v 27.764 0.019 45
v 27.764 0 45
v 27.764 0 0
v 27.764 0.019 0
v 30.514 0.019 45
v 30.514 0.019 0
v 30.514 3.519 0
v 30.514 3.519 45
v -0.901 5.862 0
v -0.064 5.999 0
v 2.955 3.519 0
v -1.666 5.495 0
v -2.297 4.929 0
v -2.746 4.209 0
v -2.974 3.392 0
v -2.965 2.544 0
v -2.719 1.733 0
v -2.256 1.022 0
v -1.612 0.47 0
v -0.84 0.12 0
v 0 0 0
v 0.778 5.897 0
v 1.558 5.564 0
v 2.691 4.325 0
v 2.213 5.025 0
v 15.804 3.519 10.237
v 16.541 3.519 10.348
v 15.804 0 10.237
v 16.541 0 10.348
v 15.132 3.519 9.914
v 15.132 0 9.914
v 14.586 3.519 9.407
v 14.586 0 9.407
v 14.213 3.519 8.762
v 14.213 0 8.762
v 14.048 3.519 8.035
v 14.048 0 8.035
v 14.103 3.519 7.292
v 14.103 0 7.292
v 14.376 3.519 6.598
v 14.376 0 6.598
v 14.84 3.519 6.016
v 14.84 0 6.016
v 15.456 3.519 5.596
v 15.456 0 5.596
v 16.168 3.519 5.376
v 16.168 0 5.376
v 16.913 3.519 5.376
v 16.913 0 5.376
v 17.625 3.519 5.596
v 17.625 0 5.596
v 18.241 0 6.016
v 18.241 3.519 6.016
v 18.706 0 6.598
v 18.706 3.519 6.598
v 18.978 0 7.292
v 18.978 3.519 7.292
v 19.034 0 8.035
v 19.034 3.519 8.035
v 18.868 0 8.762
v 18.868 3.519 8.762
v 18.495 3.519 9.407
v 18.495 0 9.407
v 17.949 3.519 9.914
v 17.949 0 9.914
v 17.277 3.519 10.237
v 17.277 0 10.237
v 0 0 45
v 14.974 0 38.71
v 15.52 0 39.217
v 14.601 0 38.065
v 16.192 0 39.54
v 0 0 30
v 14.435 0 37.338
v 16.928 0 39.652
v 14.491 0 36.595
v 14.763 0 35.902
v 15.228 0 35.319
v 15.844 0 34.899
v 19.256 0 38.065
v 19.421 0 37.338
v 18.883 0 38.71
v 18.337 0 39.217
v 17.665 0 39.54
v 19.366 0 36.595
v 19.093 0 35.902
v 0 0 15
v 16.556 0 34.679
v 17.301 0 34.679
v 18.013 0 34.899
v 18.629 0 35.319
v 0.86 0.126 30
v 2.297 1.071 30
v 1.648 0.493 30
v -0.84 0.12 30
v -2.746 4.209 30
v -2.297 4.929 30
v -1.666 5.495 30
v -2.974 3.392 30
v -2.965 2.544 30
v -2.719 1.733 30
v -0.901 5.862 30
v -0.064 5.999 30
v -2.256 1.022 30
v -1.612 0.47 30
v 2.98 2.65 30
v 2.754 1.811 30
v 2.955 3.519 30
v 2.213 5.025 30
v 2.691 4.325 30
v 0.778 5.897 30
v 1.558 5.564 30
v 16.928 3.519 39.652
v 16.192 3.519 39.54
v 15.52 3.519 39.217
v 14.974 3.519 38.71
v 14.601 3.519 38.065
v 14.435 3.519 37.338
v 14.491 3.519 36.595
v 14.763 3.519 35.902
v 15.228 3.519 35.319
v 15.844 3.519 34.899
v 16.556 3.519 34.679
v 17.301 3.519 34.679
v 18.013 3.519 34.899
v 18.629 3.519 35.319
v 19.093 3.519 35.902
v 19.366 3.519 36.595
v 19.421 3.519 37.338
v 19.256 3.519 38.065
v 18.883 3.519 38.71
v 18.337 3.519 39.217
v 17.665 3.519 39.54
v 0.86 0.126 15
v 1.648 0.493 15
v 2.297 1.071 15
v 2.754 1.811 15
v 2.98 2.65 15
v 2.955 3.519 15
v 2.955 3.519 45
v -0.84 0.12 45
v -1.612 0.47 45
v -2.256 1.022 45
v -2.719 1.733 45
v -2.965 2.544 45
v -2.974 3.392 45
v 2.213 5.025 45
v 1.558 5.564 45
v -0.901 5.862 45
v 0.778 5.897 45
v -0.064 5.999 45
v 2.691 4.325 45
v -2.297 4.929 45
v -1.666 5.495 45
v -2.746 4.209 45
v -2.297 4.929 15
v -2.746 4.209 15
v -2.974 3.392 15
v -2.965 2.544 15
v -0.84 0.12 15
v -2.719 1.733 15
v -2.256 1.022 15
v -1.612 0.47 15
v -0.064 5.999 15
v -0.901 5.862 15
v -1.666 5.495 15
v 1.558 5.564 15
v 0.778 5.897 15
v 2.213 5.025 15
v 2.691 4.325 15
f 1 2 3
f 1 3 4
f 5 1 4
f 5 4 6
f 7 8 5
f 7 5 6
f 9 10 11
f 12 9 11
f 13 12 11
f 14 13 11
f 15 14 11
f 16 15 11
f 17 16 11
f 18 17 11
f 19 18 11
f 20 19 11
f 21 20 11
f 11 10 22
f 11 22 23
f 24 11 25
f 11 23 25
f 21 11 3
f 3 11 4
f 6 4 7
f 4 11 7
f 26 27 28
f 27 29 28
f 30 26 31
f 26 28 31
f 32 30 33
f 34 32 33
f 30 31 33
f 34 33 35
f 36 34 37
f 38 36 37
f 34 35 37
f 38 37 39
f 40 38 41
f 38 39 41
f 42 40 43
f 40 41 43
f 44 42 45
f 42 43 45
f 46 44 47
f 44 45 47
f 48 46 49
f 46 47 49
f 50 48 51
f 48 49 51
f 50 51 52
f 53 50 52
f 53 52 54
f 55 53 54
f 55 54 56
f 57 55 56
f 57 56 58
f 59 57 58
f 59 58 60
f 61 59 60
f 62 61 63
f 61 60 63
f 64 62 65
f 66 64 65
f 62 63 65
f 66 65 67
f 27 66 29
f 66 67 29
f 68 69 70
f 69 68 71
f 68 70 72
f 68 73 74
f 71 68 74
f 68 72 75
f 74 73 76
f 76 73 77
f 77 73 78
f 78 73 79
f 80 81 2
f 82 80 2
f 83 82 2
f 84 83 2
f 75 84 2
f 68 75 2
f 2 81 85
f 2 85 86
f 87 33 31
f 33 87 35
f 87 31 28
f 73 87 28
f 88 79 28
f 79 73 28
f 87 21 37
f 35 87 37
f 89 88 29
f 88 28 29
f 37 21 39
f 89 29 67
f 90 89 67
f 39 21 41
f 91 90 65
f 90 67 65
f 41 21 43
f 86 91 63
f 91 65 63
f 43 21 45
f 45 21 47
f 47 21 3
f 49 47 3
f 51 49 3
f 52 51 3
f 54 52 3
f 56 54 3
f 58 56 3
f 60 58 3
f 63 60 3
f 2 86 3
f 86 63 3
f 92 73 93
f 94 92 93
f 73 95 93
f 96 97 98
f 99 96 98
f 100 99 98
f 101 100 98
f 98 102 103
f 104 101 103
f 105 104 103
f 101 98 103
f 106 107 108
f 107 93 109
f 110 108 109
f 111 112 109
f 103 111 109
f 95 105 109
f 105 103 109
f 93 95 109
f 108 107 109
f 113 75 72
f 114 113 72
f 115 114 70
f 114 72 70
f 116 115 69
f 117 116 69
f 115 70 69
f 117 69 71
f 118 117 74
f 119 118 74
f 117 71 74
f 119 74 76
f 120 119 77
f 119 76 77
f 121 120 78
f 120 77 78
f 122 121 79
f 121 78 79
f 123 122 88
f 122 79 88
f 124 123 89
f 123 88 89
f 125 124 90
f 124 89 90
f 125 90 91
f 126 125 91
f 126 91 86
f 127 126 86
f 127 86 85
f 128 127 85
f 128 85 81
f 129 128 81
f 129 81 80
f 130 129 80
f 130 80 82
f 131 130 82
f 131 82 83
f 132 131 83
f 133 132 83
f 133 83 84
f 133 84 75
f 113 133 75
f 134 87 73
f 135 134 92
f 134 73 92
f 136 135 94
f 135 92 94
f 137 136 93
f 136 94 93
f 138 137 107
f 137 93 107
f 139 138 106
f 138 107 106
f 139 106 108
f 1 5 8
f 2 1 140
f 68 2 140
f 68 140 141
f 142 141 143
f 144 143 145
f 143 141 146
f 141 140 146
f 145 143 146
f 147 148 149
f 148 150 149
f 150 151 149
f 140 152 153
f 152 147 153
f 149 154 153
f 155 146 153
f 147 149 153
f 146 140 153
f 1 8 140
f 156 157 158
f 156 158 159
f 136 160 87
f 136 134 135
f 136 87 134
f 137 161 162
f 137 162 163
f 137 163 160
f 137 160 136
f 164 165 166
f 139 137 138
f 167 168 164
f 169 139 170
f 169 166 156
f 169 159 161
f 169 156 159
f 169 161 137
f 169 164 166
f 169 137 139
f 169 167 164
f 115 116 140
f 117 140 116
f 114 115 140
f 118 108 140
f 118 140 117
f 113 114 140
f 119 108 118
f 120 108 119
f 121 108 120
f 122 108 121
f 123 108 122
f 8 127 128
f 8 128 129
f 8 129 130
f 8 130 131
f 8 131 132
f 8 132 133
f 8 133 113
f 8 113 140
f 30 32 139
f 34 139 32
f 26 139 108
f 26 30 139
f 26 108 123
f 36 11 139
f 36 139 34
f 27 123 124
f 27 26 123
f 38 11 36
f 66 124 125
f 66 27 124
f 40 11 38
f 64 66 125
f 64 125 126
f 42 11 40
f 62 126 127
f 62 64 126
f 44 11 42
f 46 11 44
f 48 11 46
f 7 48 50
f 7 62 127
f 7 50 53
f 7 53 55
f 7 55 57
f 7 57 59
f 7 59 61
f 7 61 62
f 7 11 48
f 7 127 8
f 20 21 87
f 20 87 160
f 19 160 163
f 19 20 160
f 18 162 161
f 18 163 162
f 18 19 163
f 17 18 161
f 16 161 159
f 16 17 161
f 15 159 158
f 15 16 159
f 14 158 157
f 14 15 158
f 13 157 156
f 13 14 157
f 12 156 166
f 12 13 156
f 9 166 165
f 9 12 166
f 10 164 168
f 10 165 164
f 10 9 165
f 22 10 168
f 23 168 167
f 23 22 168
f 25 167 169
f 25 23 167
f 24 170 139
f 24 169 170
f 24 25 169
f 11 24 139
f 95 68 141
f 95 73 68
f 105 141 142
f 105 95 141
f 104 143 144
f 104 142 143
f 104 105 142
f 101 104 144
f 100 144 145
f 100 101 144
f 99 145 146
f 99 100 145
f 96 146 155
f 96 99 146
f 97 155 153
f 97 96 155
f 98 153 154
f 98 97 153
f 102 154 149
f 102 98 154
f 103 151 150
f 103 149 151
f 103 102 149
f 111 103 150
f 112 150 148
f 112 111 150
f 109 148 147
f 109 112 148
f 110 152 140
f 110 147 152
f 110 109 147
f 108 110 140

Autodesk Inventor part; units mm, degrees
ref_plane "YZ Plane" through (0, 0, 0) normal (1, 0, 0) x (0, 1, 0)
ref_plane "XZ Plane" through (0, 0, 0) normal (0, 1, 0) x (-1, 0, 0)
ref_plane "XY Plane" through (0, 0, 0) normal (0, 0, 1) x (1, 0, 0)
sketch "Sketch11" plane through (0, 0, 0) normal (0, 0, 1) x (1, 0, 0)
  line L0 (0, 0) -> (27.764, 0)
  line L1 (27.764, 0) -> (27.764, 3.519)
  line L2 (27.764, 3.519) -> (0, 3.519)
  line L3 (0, 3.519) -> (0, 0)
  circle A0 centre (0, 3) radius 3
  point P0 (2.9548, 3.519)
  dimension "d25" = 27.764
  dimension "d26" = 3.519
  dimension "d27" = 6
extrude "Extrusion5" add sketch "Sketch11" along normal blind 45
ref_plane "Work Plane3" through (0, 0, 30) normal (0, 0, 1) x (1, 0, 0)
sketch "Sketch12" plane through (0, 0, 30) normal (0, 0, 1) x (1, 0, 0)
  circle A0 centre (0, 3) radius 3
  point P0 (0, 0)
  dimension "d32" = 6
extrude "Extrusion6" cut sketch "Sketch12" against normal blind 15
sketch "Sketch13" plane through (27.764, 0, 0) normal (1, 0, 0) x (0, 0, -1)
  point P0 (0, 0)
sketch "Sketch14" plane through (2.9548, 3.519, 0) normal (0, 1, 0) x (1, 0, 0)
  line L0 (24.8092, 0) -> (24.8092, -45) projected
  line L1 (24.8092, 0) -> (30.3097, 0)
  line L2 (30.3097, 0) -> (30.3097, -45)
  line L3 (30.3097, -45) -> (24.8092, -45)
  line L4 (24.8092, -45) -> (24.8092, 0)
  point P0 (-2.9548, 0)
  dimension "d35" = 45
extrude "Extrusion7" add sketch "Sketch14" against normal blind 3.5
sketch "Sketch15" plane through (2.9548, 3.519, 15) normal (0, 1, 0) x (1, 0, 0)
  line L0 (30.3097, 15) -> (30.3097, -30) projected
  line L1 (24.8092, 15) -> (30.3097, 15) projected
  line L2 (30.3097, -30) -> (27.5595, -30)
  line L3 (27.5595, -30) -> (27.5595, 15)
  line L4 (27.5595, 15) -> (30.3097, 15)
  line L5 (30.3097, 15) -> (30.3097, -30)
  point P0 (-2.9548, 15)
extrude "Extrusion8" cut sketch "Sketch15" against normal blind 3.5
sketch "Sketch16" plane through (1.0163, 3.519, 45.1466) normal (0, 1, 0) x (1, 0, 0)
  point P0 (-2.9547, 45)
  point P1 (15.912, 7.9951)
  point P2 (15.5243, 37.2981)
hole "Hole2" at (16.9284, 3.519, 37.1515) at (16.5406, 3.519, 7.8485) direction (0, -1, 0) diameter 5 end through all
properties part number "final right" material "Stainless Steel"
